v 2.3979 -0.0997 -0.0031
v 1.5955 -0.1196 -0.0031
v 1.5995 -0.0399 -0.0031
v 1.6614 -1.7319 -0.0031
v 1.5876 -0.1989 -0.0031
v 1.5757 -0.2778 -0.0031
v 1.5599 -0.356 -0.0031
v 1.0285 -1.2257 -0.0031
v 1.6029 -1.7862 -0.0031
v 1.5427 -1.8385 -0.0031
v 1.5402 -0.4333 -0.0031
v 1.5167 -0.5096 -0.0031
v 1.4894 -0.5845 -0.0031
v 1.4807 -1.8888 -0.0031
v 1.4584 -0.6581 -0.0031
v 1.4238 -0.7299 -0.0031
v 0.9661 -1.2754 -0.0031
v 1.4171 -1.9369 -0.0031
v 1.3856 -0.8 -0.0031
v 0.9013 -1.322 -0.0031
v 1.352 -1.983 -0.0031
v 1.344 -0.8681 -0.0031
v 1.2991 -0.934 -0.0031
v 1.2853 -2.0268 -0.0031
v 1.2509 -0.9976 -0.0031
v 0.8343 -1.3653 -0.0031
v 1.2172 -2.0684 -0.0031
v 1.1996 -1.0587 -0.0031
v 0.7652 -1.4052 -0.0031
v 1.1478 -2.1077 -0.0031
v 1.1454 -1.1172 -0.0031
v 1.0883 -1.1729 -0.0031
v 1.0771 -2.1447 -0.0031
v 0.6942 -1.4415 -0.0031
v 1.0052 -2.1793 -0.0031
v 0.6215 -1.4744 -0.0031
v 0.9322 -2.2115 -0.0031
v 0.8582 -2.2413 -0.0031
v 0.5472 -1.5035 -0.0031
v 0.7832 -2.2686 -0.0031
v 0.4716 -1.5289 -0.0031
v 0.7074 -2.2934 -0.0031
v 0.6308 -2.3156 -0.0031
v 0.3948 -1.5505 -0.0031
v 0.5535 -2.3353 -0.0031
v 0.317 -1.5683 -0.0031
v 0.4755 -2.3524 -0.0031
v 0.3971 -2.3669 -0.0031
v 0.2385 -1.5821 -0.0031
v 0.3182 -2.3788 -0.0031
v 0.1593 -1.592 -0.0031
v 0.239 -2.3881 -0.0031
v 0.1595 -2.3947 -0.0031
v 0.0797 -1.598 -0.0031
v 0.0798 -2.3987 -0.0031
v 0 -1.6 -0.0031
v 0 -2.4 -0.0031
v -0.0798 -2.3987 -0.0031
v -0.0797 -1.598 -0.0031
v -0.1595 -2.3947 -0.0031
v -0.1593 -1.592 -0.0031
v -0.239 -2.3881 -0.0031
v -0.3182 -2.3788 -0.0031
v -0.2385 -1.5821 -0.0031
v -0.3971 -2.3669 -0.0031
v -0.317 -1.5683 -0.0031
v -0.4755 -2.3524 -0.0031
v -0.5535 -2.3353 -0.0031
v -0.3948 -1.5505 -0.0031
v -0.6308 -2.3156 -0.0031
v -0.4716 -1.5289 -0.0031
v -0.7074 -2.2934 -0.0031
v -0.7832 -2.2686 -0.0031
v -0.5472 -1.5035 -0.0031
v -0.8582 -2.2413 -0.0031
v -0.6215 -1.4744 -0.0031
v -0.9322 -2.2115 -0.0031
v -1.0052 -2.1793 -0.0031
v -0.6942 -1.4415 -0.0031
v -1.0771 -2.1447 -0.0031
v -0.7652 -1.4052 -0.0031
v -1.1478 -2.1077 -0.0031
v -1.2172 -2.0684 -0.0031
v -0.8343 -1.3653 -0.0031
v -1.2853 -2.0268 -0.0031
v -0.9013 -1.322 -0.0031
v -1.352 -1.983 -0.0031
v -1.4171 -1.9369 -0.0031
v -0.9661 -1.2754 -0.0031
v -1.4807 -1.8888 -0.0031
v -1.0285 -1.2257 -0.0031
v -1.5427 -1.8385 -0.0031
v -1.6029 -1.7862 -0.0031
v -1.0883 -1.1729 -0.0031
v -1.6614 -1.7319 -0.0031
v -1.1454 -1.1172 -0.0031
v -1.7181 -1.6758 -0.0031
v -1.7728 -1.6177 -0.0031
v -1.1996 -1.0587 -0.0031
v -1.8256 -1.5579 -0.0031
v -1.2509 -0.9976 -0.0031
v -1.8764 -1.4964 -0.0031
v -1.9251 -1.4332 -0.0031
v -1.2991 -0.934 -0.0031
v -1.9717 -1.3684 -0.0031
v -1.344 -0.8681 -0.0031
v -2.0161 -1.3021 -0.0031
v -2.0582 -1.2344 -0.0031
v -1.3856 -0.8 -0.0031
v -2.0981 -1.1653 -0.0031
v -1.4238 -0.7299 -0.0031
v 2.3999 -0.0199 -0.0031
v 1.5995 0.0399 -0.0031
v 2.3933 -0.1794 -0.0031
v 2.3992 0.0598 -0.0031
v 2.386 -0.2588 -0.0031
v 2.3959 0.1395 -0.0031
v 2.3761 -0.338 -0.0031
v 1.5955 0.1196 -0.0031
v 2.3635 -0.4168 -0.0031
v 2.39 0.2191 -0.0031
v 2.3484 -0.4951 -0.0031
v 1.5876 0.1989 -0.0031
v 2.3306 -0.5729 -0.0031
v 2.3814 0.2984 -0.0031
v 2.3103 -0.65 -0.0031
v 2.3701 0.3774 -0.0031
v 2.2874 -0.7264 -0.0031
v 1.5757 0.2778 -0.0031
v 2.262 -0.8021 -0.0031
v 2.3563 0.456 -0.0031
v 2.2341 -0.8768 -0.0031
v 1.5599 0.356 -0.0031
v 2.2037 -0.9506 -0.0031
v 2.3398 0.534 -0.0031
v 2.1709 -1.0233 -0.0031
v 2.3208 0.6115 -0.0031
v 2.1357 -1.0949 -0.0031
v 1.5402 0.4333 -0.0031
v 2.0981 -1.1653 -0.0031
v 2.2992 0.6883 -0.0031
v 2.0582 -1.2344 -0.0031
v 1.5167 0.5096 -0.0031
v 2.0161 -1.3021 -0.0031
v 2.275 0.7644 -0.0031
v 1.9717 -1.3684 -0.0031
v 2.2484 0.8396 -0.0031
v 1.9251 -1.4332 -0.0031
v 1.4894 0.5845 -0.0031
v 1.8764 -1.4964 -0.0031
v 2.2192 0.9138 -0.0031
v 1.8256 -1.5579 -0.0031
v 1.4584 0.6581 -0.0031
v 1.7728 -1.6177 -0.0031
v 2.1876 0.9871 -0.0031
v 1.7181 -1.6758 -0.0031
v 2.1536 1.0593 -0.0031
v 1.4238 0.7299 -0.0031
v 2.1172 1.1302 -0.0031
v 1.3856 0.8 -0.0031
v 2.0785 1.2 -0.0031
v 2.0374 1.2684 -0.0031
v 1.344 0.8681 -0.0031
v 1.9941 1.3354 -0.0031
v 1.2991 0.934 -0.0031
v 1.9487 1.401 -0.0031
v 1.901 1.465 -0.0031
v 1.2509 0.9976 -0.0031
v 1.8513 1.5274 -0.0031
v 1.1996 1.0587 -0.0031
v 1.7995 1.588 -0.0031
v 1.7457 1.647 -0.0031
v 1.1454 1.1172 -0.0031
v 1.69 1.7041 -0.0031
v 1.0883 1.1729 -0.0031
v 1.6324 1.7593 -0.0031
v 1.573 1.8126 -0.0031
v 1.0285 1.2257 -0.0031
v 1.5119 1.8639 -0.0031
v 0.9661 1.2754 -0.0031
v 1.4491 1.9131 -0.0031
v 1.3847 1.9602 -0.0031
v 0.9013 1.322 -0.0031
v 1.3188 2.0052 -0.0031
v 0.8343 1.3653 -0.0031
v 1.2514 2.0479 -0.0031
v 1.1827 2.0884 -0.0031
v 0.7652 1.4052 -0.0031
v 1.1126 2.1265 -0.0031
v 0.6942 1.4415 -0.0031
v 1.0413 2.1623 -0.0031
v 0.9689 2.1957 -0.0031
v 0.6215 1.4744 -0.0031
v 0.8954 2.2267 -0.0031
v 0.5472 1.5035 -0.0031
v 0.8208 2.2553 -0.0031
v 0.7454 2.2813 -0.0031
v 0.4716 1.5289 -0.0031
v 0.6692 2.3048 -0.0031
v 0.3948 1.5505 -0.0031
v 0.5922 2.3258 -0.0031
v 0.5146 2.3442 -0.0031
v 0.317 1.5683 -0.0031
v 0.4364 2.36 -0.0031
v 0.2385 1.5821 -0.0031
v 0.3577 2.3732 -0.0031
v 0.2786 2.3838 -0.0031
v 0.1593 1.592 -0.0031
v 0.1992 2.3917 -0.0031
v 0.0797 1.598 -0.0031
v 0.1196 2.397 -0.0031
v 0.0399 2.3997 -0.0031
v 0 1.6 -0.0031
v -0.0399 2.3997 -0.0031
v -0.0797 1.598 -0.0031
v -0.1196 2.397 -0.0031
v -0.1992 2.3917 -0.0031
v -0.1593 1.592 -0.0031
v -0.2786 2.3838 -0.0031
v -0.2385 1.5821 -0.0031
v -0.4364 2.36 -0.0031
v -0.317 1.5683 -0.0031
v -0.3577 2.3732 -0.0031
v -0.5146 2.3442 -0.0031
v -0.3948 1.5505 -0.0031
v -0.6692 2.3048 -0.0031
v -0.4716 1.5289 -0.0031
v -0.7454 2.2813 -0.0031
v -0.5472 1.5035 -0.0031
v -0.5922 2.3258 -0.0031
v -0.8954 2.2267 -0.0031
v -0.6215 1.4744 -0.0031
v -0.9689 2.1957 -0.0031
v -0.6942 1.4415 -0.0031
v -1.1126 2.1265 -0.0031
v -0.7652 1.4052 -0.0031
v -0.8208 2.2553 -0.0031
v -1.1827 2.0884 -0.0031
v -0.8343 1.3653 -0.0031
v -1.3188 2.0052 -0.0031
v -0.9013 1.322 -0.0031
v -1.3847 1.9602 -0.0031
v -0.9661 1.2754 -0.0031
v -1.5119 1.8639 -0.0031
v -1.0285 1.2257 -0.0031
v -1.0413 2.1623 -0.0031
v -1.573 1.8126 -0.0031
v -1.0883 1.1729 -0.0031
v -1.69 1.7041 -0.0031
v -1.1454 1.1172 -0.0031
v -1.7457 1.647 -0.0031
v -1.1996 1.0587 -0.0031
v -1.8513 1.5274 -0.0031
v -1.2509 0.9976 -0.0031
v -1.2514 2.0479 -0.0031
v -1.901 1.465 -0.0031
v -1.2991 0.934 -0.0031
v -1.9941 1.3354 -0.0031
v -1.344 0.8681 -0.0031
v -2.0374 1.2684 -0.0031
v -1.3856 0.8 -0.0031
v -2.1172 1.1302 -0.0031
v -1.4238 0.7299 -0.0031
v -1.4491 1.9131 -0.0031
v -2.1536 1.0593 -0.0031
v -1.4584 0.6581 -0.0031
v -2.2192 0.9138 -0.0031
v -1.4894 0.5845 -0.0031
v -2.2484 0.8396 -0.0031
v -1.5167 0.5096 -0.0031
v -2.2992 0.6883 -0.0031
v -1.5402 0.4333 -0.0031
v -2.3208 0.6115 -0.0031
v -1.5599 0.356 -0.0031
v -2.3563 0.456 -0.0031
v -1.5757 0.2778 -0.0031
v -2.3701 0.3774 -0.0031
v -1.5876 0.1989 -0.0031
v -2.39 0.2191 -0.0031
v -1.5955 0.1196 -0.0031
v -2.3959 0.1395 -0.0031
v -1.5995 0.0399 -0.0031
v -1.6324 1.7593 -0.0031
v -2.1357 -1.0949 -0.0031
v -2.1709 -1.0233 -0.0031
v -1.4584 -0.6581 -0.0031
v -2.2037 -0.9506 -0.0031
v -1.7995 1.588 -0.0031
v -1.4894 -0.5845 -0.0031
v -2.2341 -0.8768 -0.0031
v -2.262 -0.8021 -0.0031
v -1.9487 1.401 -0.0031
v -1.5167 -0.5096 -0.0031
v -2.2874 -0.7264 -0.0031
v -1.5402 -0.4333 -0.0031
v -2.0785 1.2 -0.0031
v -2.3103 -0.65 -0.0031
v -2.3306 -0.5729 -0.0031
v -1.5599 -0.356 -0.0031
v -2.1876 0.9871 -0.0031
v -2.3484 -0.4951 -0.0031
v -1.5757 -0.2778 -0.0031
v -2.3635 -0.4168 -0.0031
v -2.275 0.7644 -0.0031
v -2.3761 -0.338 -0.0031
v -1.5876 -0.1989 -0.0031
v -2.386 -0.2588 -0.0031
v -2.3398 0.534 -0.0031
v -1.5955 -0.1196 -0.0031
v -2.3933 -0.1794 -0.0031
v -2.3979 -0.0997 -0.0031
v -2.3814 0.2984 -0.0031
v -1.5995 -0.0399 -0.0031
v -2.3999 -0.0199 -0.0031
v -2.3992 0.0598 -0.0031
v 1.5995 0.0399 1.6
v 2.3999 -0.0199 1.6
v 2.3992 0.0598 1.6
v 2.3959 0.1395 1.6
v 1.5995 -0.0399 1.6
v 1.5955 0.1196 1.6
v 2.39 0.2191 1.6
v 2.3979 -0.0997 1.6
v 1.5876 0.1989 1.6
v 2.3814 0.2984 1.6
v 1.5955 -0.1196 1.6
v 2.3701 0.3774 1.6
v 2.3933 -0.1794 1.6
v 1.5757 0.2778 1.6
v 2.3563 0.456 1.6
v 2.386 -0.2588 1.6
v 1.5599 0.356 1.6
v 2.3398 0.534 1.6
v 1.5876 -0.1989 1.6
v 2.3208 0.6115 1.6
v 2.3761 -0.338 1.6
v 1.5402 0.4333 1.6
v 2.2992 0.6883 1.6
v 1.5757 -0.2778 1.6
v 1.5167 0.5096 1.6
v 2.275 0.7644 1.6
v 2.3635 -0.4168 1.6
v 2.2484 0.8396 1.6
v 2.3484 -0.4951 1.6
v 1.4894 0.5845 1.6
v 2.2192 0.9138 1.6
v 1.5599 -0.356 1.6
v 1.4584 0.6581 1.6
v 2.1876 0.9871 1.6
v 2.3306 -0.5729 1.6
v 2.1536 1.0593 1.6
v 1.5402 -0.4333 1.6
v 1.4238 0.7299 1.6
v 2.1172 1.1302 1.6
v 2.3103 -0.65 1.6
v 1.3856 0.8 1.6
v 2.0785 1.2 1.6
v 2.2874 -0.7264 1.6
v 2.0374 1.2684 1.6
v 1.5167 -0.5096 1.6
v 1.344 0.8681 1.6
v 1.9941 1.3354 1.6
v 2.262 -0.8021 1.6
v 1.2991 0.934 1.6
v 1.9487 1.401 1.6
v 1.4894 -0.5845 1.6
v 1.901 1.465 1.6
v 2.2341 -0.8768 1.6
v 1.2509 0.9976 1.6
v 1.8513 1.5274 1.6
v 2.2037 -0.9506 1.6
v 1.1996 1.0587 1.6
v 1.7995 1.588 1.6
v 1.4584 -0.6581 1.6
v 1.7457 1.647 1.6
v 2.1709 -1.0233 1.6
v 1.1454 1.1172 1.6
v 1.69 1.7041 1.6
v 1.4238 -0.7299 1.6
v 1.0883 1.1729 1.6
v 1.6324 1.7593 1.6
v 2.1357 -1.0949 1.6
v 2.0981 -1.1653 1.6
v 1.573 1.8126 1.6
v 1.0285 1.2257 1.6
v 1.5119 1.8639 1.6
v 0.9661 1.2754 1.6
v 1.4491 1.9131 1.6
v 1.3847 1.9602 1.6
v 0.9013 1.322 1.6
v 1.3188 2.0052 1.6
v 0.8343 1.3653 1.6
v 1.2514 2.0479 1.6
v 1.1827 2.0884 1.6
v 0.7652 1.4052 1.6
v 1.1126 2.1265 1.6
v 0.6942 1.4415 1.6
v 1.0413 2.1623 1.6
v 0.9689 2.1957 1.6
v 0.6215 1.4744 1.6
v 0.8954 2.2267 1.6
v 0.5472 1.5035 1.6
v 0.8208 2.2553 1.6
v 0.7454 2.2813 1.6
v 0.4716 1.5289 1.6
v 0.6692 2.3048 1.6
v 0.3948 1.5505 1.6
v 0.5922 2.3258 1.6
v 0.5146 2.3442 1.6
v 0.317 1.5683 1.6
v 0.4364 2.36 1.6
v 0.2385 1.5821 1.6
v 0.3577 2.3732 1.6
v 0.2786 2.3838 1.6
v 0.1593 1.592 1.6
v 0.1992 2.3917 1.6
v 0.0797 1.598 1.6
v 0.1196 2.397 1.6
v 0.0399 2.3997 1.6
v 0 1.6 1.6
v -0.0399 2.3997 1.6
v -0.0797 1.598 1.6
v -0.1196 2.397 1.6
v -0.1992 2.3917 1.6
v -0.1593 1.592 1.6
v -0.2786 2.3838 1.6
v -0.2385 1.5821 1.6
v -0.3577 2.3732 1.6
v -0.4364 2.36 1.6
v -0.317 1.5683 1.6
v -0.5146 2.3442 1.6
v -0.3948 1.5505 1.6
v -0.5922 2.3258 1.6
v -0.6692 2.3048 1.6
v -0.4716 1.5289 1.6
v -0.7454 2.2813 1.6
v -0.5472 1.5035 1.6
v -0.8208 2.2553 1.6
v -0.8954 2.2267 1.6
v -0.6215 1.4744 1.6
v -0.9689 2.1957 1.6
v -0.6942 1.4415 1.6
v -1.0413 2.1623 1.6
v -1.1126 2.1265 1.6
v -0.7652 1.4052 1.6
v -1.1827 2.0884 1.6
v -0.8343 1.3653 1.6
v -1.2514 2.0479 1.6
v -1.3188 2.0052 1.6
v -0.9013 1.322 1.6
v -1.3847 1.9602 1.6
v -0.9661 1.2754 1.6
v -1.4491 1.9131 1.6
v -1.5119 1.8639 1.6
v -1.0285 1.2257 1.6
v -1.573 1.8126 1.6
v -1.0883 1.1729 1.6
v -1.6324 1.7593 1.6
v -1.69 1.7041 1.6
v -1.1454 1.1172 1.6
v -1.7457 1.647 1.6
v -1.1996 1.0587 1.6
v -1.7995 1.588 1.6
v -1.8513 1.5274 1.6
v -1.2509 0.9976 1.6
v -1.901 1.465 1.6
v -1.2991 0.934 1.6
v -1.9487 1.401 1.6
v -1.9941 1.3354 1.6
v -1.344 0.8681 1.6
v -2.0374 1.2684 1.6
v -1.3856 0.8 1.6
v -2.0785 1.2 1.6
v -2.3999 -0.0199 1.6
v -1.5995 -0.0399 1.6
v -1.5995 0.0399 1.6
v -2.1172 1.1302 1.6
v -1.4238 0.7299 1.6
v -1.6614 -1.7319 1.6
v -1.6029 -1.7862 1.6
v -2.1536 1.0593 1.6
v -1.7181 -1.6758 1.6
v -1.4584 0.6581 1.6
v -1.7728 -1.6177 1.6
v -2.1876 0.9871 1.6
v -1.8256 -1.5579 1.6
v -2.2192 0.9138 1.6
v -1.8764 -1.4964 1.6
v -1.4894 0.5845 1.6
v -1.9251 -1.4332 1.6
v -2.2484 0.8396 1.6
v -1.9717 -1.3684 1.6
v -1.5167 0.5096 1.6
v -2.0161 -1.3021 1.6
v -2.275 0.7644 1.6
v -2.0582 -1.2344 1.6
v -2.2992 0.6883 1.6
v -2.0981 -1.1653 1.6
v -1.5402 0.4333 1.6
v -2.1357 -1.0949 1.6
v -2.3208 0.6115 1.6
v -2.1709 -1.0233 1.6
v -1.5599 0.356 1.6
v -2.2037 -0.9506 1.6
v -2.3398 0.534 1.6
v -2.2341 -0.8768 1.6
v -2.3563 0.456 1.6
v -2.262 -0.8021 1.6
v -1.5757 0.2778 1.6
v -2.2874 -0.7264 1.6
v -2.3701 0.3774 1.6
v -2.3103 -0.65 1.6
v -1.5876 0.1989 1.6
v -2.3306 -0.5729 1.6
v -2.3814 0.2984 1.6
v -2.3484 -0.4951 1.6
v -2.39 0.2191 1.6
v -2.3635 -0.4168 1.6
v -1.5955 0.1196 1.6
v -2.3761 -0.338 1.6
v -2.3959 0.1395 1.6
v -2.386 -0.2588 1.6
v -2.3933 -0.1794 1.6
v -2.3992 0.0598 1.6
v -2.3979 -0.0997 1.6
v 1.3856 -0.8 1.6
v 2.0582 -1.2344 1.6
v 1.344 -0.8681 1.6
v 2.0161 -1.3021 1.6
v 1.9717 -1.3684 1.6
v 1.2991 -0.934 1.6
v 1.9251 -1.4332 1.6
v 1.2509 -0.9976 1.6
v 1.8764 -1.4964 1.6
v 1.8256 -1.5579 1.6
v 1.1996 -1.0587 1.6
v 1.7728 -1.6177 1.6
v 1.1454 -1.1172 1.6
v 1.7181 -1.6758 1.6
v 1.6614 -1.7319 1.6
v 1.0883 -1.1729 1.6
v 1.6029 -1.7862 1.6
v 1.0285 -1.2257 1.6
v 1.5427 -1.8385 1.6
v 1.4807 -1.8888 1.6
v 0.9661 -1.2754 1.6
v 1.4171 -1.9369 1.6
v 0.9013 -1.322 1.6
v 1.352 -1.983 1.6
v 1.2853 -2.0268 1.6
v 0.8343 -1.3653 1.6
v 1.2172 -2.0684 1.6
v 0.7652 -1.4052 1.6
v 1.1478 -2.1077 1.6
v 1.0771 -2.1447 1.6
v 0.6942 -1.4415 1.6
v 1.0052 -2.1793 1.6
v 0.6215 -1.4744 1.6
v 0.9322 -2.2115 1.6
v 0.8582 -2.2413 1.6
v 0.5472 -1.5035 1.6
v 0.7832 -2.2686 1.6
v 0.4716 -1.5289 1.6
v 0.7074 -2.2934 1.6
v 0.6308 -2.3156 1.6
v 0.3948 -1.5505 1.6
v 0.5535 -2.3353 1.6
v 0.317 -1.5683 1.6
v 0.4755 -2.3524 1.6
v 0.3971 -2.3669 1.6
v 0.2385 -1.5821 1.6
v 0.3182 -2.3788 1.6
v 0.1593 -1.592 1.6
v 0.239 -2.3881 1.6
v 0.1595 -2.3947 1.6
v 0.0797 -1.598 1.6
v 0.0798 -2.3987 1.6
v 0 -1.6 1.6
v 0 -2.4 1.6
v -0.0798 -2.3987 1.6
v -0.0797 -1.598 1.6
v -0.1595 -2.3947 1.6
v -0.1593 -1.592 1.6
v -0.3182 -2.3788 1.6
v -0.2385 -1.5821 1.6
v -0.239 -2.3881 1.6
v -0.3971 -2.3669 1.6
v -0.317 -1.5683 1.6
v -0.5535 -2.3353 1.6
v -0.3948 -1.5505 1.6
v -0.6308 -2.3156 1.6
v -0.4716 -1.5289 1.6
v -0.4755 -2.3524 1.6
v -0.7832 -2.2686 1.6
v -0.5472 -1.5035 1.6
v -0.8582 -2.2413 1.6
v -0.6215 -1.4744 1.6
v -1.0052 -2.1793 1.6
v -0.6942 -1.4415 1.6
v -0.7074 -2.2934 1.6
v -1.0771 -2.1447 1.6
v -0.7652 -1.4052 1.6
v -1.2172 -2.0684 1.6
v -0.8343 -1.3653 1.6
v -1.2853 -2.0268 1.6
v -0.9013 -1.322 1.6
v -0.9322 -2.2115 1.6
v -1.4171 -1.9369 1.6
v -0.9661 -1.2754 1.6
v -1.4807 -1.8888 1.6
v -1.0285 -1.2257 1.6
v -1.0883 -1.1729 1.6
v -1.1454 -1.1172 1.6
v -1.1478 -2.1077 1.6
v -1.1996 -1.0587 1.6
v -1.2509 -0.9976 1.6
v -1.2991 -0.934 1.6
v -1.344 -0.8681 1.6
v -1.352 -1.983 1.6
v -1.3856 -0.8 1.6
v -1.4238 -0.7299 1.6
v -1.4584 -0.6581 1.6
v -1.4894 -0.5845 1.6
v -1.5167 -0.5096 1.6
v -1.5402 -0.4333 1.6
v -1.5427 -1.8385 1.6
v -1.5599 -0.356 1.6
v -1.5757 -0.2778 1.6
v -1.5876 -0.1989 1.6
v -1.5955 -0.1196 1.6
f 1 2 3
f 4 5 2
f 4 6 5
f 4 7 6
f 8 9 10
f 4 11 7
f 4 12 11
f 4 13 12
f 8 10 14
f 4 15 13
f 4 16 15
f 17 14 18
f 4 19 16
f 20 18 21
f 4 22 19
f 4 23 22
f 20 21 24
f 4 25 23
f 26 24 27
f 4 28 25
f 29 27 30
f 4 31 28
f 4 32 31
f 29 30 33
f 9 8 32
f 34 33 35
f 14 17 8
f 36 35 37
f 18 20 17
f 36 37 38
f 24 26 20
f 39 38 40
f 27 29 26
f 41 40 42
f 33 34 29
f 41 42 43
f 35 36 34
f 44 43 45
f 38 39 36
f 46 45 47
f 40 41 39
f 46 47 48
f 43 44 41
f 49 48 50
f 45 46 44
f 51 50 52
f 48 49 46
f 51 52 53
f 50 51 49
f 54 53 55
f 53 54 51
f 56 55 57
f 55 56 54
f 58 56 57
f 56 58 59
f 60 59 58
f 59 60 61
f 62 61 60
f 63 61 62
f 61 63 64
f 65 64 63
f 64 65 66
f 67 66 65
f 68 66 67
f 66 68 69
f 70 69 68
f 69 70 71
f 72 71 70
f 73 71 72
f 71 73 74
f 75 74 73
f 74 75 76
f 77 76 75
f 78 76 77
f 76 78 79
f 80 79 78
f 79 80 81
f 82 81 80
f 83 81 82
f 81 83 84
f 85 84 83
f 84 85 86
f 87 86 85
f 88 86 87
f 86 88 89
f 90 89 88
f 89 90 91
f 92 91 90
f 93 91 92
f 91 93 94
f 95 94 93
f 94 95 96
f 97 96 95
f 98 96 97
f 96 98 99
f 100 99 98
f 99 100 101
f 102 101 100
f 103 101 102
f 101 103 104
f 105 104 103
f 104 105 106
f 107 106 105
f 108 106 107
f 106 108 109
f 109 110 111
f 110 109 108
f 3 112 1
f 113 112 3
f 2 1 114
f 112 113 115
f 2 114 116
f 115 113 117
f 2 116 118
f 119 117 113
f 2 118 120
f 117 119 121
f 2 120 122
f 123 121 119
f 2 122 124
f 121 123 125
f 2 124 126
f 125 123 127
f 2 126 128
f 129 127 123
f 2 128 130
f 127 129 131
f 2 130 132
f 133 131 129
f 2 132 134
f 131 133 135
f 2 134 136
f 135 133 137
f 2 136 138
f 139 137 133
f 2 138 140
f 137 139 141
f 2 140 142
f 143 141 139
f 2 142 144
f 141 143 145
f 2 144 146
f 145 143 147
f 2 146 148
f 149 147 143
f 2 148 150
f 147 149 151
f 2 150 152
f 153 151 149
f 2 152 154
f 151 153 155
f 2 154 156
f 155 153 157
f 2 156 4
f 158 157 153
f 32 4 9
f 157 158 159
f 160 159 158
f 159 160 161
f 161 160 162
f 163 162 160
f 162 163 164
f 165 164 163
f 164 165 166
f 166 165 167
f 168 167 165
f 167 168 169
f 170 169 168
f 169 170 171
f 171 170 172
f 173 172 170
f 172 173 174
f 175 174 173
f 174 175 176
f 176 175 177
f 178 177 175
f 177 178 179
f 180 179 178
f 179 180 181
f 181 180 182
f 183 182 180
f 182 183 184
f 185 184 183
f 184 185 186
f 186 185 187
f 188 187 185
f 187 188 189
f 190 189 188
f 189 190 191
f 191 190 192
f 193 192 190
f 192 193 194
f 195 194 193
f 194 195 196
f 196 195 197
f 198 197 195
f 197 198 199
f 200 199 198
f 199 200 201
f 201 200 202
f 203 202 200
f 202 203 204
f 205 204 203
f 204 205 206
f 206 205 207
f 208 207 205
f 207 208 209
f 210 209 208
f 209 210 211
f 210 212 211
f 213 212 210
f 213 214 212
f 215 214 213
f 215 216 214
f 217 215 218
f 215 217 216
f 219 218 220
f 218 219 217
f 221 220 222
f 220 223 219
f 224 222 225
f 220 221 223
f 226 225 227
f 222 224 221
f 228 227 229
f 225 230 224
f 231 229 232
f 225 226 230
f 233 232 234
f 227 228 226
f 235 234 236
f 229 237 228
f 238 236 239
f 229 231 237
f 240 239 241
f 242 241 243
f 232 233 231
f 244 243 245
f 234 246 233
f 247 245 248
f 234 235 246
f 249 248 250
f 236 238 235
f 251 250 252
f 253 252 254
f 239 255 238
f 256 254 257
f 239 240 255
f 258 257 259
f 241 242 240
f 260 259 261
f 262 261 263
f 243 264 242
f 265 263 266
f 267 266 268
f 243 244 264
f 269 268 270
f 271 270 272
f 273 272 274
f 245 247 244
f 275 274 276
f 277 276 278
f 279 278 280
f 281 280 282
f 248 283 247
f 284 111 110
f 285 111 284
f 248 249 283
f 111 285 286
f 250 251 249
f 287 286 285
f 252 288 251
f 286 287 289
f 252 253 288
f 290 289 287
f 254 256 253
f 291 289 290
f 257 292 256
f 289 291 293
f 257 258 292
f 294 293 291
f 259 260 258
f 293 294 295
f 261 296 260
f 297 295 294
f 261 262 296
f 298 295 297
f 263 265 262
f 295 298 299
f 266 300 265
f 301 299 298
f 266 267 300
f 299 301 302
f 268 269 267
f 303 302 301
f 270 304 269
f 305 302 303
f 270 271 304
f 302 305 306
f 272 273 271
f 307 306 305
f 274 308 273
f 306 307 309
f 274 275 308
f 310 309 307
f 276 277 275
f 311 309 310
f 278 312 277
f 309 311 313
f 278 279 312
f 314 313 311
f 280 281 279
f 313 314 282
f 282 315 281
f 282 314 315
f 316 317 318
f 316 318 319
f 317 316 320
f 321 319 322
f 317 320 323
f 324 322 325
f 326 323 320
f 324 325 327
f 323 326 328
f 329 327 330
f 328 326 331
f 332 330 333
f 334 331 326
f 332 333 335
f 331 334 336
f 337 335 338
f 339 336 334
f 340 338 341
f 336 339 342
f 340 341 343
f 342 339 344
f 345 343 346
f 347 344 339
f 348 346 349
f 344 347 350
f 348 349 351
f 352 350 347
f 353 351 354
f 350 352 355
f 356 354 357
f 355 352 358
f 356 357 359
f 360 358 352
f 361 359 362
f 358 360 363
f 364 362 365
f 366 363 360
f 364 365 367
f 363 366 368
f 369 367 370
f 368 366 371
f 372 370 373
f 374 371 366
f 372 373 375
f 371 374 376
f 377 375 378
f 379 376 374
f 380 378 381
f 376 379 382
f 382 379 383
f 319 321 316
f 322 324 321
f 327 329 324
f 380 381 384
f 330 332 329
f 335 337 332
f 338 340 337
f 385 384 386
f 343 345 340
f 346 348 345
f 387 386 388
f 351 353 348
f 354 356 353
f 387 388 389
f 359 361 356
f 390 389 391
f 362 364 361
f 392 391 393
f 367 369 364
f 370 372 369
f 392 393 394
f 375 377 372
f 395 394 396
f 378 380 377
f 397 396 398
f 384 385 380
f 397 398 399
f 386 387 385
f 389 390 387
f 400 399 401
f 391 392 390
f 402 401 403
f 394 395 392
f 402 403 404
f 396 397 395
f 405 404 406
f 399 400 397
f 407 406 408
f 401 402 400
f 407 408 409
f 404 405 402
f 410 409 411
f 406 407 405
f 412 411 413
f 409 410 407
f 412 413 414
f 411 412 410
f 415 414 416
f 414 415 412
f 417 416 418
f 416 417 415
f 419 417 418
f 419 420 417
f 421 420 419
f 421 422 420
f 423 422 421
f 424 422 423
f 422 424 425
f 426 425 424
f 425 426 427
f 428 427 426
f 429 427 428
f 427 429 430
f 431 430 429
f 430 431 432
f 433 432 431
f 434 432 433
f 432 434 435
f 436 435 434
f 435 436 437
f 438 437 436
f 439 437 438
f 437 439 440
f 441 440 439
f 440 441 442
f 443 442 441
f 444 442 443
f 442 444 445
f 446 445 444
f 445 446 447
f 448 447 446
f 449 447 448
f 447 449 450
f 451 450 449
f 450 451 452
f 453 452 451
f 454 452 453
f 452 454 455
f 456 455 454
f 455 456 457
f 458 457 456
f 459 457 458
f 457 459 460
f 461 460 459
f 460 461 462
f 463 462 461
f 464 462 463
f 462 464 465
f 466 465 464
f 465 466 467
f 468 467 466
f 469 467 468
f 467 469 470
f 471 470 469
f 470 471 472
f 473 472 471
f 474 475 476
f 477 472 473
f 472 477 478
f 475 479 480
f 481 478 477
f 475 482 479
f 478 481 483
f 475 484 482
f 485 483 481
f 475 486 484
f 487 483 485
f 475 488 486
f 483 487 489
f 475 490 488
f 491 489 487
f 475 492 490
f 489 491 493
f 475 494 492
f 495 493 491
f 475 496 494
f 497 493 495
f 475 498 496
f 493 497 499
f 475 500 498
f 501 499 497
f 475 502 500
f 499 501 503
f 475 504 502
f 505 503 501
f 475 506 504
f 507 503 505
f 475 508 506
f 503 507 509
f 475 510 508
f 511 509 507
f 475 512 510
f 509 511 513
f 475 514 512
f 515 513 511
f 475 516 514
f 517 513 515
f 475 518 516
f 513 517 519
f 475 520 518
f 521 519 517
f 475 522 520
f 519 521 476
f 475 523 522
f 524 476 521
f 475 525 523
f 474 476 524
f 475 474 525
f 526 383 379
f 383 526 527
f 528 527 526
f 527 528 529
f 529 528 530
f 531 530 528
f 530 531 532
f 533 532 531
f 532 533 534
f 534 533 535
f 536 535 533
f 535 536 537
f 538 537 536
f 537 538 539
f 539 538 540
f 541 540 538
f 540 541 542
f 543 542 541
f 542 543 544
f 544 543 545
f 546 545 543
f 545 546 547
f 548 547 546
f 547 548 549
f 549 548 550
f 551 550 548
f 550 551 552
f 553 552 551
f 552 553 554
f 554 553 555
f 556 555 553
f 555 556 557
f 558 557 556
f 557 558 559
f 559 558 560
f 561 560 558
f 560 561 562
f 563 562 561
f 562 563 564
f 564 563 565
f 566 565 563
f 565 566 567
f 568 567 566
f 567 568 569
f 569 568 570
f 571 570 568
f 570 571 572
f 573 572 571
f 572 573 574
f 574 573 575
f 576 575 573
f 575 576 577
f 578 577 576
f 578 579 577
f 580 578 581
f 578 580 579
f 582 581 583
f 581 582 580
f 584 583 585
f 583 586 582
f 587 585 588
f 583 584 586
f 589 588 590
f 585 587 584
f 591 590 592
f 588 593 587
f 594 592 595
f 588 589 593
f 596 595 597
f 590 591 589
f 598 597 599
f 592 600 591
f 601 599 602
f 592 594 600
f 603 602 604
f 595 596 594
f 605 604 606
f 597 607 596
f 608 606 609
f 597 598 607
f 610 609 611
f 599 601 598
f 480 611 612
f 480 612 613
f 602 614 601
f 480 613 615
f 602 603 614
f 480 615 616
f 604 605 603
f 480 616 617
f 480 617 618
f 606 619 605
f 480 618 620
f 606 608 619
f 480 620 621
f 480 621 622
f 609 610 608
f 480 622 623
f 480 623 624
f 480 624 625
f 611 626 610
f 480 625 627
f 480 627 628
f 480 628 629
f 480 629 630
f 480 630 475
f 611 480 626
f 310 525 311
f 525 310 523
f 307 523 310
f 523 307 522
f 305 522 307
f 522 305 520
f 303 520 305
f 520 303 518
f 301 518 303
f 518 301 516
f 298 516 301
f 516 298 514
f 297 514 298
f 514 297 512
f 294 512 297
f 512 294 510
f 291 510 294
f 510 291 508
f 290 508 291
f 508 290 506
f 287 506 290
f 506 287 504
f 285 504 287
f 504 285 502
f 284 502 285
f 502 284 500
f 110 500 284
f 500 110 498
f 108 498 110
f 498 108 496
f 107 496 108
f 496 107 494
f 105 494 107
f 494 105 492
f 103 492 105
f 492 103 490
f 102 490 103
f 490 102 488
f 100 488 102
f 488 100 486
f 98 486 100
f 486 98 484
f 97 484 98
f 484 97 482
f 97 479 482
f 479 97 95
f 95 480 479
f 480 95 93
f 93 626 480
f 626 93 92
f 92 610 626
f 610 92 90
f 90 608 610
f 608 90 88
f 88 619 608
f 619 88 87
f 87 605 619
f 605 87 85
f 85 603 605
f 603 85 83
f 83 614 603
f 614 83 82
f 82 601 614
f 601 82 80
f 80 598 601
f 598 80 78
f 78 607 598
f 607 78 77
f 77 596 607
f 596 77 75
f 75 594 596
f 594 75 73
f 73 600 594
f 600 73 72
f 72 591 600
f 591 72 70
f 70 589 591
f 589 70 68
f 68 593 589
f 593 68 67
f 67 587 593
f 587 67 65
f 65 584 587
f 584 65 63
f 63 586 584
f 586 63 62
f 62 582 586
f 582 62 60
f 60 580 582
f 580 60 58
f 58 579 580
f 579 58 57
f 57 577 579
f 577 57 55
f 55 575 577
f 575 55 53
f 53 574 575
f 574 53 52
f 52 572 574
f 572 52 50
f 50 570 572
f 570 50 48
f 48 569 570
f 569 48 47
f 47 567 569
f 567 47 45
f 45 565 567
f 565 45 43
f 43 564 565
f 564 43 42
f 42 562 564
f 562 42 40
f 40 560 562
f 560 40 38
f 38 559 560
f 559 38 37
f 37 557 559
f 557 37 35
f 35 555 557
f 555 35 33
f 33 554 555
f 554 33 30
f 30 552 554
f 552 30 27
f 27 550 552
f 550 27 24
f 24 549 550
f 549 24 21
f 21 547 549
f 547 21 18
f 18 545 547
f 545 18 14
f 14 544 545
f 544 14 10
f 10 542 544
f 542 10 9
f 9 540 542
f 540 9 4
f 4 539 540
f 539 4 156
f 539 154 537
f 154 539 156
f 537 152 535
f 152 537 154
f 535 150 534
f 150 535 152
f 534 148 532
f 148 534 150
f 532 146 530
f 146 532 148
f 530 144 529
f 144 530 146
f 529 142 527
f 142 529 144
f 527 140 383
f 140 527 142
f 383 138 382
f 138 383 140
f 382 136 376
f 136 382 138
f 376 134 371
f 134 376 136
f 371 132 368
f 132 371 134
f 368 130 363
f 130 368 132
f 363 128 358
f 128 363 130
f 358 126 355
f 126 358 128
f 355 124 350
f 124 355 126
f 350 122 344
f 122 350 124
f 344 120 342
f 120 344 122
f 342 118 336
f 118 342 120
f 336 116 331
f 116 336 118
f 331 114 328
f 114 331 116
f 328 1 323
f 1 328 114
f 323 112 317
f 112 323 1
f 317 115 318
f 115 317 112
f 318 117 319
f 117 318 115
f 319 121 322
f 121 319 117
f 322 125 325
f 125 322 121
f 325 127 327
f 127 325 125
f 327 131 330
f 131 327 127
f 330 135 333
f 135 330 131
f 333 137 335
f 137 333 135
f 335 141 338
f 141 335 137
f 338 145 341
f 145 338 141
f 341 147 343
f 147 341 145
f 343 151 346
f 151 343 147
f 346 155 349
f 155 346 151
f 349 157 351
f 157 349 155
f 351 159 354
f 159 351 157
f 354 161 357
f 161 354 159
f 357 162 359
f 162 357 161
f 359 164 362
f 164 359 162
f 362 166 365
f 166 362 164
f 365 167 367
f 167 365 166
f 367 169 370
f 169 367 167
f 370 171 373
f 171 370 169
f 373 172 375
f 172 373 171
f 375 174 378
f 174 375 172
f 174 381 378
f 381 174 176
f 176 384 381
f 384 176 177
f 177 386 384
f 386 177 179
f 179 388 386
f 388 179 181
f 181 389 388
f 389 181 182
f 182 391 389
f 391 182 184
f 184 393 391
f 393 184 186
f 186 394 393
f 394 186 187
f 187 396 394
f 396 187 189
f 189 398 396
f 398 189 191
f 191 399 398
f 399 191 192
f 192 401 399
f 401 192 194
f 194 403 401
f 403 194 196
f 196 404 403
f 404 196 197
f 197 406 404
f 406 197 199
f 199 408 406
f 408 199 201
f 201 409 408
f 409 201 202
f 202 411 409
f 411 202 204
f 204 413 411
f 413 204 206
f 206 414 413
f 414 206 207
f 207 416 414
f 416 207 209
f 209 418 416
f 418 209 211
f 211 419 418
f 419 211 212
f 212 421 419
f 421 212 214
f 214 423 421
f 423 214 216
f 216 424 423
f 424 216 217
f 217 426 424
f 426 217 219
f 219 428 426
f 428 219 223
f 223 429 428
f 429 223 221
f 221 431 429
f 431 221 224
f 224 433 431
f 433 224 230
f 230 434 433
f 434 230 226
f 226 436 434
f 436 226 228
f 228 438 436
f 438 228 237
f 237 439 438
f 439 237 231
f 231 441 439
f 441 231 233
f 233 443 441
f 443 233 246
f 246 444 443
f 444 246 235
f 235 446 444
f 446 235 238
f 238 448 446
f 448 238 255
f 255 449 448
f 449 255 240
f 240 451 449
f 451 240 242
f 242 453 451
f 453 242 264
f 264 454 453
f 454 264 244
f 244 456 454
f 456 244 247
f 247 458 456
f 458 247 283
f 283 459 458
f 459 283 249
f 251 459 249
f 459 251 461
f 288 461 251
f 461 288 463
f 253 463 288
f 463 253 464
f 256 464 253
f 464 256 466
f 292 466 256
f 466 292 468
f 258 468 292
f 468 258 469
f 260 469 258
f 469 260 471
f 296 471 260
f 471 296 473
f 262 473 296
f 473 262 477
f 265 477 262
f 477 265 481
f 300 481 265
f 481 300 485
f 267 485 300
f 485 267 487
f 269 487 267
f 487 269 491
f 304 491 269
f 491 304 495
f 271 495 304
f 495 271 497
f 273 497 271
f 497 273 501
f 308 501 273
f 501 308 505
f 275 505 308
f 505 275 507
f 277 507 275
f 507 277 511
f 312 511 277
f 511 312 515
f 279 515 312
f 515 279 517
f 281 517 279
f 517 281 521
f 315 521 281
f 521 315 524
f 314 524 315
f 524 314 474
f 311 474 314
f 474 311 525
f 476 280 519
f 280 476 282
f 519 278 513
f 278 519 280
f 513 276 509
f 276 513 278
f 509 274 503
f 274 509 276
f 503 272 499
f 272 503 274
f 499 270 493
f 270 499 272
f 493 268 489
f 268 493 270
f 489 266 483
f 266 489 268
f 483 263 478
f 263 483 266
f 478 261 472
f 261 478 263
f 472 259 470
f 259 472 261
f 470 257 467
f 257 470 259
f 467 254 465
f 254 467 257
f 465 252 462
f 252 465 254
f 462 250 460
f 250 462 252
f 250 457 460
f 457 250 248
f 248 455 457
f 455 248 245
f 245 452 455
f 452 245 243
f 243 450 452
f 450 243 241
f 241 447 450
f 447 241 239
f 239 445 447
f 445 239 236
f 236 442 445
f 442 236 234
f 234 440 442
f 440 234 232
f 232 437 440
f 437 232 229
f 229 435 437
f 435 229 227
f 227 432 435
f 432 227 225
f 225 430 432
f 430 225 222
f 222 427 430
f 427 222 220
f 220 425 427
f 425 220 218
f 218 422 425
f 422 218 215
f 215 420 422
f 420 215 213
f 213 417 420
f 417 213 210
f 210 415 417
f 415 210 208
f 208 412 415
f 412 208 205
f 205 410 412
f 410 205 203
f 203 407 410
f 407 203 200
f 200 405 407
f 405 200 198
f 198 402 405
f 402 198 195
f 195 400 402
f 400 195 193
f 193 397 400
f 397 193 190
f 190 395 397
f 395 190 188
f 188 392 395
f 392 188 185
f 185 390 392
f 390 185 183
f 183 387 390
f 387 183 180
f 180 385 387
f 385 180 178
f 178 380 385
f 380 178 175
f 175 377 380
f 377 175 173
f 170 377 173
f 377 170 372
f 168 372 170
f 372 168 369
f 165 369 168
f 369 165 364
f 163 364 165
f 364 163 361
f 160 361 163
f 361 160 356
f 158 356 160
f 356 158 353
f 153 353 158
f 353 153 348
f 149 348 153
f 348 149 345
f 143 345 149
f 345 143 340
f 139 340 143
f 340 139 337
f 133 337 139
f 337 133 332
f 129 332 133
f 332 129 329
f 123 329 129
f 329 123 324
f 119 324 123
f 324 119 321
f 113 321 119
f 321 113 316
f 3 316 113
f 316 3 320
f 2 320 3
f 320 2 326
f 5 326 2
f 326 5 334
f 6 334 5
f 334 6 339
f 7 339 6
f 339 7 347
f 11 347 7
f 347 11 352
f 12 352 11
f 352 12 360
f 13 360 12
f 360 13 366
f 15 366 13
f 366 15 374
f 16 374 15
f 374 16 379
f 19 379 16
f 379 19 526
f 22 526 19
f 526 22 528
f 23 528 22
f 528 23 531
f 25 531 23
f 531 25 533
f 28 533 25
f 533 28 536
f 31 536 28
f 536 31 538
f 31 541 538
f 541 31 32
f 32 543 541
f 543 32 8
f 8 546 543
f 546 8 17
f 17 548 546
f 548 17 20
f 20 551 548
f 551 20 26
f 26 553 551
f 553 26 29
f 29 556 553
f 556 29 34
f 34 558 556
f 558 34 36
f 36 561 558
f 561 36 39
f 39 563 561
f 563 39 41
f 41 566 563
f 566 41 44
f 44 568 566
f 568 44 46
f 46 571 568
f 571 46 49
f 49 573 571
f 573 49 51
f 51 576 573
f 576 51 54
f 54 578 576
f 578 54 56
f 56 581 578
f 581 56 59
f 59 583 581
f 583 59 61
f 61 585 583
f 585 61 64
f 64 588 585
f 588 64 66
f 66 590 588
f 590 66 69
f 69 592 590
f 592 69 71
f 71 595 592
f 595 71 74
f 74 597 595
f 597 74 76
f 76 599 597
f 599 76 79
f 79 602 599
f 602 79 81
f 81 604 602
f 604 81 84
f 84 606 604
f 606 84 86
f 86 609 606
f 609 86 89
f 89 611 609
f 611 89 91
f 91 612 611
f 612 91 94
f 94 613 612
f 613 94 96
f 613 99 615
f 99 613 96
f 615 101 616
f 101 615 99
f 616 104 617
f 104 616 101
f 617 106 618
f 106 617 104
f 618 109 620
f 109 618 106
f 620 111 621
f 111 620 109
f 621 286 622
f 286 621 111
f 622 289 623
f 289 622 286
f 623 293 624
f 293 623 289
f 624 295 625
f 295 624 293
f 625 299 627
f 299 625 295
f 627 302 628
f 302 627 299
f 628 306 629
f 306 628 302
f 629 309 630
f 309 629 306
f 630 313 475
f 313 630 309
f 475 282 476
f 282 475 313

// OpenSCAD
use <../lib.scad>
use <s/4181s01.scad>
use <s/4181s02.scad>
use <../p/stud2.scad>
$fa=1; $fs=0.2;
function ldraw_lib__4182p01(realsolid=false) = [
// 0 Train Door  1 x  4 x  5 Right with Yellow Bottom Half Pattern
// 0 Name: 4182p01.dat
// 0 Author: James Jessiman
// 0 !LDRAW_ORG Part UPDATE 2009-02
// 0 !LICENSE Licensed under CC BY 2.0 and CC BY 4.0 : see CAreadme.txt
// 
// 0 BFC CERTIFY CCW
  [0,"BFC","CERTIFY"],
  [0,"BFC","CCW"],
// 
// 0 !HISTORY 2007-07-04 [PTadmin] Header formatted for Contributor Agreement
// 0 !HISTORY 2008-07-01 [PTadmin] Official Update 2008-01
// 0 !HISTORY 2008-07-07 [WilliamH] BFCed; sub-parted (2006-09-12)
// 0 !HISTORY 2009-09-03 [PTadmin] Official Update 2009-02
// 
// 
// 1 16 0 0 0 1 0 0 0 1 0 0 0 1 stud2.dat
  [1,16,0,0,0,1,0,0,0,1,0,0,0,1, ldraw_lib__stud2(realsolid)],
// 1 16 0 0 0 -1 0 0 0 1 0 0 0 1 s\4181s01.dat
  [1,16,0,0,0,-1,0,0,0,1,0,0,0,1, ldraw_lib__s__4181s01(realsolid)],
// 1 14 0 72 0 -1 0 0 0 6 0 0 0 1 s\4181s02.dat
  [1,14,0,72,0,-1,0,0,0,6,0,0,0,1, ldraw_lib__s__4181s02(realsolid)],
// 0
];
module ldraw_lib__4182p01(step=0, col=false, unit=2/5, alt=false, line=0.2, solid=!$preview)
    makepoly(ldraw_lib__4182p01(solid), step=step, col=col, unit=unit, alt=alt, line=line, solid=solid);
ldraw_lib__4182p01(line=0.2);
